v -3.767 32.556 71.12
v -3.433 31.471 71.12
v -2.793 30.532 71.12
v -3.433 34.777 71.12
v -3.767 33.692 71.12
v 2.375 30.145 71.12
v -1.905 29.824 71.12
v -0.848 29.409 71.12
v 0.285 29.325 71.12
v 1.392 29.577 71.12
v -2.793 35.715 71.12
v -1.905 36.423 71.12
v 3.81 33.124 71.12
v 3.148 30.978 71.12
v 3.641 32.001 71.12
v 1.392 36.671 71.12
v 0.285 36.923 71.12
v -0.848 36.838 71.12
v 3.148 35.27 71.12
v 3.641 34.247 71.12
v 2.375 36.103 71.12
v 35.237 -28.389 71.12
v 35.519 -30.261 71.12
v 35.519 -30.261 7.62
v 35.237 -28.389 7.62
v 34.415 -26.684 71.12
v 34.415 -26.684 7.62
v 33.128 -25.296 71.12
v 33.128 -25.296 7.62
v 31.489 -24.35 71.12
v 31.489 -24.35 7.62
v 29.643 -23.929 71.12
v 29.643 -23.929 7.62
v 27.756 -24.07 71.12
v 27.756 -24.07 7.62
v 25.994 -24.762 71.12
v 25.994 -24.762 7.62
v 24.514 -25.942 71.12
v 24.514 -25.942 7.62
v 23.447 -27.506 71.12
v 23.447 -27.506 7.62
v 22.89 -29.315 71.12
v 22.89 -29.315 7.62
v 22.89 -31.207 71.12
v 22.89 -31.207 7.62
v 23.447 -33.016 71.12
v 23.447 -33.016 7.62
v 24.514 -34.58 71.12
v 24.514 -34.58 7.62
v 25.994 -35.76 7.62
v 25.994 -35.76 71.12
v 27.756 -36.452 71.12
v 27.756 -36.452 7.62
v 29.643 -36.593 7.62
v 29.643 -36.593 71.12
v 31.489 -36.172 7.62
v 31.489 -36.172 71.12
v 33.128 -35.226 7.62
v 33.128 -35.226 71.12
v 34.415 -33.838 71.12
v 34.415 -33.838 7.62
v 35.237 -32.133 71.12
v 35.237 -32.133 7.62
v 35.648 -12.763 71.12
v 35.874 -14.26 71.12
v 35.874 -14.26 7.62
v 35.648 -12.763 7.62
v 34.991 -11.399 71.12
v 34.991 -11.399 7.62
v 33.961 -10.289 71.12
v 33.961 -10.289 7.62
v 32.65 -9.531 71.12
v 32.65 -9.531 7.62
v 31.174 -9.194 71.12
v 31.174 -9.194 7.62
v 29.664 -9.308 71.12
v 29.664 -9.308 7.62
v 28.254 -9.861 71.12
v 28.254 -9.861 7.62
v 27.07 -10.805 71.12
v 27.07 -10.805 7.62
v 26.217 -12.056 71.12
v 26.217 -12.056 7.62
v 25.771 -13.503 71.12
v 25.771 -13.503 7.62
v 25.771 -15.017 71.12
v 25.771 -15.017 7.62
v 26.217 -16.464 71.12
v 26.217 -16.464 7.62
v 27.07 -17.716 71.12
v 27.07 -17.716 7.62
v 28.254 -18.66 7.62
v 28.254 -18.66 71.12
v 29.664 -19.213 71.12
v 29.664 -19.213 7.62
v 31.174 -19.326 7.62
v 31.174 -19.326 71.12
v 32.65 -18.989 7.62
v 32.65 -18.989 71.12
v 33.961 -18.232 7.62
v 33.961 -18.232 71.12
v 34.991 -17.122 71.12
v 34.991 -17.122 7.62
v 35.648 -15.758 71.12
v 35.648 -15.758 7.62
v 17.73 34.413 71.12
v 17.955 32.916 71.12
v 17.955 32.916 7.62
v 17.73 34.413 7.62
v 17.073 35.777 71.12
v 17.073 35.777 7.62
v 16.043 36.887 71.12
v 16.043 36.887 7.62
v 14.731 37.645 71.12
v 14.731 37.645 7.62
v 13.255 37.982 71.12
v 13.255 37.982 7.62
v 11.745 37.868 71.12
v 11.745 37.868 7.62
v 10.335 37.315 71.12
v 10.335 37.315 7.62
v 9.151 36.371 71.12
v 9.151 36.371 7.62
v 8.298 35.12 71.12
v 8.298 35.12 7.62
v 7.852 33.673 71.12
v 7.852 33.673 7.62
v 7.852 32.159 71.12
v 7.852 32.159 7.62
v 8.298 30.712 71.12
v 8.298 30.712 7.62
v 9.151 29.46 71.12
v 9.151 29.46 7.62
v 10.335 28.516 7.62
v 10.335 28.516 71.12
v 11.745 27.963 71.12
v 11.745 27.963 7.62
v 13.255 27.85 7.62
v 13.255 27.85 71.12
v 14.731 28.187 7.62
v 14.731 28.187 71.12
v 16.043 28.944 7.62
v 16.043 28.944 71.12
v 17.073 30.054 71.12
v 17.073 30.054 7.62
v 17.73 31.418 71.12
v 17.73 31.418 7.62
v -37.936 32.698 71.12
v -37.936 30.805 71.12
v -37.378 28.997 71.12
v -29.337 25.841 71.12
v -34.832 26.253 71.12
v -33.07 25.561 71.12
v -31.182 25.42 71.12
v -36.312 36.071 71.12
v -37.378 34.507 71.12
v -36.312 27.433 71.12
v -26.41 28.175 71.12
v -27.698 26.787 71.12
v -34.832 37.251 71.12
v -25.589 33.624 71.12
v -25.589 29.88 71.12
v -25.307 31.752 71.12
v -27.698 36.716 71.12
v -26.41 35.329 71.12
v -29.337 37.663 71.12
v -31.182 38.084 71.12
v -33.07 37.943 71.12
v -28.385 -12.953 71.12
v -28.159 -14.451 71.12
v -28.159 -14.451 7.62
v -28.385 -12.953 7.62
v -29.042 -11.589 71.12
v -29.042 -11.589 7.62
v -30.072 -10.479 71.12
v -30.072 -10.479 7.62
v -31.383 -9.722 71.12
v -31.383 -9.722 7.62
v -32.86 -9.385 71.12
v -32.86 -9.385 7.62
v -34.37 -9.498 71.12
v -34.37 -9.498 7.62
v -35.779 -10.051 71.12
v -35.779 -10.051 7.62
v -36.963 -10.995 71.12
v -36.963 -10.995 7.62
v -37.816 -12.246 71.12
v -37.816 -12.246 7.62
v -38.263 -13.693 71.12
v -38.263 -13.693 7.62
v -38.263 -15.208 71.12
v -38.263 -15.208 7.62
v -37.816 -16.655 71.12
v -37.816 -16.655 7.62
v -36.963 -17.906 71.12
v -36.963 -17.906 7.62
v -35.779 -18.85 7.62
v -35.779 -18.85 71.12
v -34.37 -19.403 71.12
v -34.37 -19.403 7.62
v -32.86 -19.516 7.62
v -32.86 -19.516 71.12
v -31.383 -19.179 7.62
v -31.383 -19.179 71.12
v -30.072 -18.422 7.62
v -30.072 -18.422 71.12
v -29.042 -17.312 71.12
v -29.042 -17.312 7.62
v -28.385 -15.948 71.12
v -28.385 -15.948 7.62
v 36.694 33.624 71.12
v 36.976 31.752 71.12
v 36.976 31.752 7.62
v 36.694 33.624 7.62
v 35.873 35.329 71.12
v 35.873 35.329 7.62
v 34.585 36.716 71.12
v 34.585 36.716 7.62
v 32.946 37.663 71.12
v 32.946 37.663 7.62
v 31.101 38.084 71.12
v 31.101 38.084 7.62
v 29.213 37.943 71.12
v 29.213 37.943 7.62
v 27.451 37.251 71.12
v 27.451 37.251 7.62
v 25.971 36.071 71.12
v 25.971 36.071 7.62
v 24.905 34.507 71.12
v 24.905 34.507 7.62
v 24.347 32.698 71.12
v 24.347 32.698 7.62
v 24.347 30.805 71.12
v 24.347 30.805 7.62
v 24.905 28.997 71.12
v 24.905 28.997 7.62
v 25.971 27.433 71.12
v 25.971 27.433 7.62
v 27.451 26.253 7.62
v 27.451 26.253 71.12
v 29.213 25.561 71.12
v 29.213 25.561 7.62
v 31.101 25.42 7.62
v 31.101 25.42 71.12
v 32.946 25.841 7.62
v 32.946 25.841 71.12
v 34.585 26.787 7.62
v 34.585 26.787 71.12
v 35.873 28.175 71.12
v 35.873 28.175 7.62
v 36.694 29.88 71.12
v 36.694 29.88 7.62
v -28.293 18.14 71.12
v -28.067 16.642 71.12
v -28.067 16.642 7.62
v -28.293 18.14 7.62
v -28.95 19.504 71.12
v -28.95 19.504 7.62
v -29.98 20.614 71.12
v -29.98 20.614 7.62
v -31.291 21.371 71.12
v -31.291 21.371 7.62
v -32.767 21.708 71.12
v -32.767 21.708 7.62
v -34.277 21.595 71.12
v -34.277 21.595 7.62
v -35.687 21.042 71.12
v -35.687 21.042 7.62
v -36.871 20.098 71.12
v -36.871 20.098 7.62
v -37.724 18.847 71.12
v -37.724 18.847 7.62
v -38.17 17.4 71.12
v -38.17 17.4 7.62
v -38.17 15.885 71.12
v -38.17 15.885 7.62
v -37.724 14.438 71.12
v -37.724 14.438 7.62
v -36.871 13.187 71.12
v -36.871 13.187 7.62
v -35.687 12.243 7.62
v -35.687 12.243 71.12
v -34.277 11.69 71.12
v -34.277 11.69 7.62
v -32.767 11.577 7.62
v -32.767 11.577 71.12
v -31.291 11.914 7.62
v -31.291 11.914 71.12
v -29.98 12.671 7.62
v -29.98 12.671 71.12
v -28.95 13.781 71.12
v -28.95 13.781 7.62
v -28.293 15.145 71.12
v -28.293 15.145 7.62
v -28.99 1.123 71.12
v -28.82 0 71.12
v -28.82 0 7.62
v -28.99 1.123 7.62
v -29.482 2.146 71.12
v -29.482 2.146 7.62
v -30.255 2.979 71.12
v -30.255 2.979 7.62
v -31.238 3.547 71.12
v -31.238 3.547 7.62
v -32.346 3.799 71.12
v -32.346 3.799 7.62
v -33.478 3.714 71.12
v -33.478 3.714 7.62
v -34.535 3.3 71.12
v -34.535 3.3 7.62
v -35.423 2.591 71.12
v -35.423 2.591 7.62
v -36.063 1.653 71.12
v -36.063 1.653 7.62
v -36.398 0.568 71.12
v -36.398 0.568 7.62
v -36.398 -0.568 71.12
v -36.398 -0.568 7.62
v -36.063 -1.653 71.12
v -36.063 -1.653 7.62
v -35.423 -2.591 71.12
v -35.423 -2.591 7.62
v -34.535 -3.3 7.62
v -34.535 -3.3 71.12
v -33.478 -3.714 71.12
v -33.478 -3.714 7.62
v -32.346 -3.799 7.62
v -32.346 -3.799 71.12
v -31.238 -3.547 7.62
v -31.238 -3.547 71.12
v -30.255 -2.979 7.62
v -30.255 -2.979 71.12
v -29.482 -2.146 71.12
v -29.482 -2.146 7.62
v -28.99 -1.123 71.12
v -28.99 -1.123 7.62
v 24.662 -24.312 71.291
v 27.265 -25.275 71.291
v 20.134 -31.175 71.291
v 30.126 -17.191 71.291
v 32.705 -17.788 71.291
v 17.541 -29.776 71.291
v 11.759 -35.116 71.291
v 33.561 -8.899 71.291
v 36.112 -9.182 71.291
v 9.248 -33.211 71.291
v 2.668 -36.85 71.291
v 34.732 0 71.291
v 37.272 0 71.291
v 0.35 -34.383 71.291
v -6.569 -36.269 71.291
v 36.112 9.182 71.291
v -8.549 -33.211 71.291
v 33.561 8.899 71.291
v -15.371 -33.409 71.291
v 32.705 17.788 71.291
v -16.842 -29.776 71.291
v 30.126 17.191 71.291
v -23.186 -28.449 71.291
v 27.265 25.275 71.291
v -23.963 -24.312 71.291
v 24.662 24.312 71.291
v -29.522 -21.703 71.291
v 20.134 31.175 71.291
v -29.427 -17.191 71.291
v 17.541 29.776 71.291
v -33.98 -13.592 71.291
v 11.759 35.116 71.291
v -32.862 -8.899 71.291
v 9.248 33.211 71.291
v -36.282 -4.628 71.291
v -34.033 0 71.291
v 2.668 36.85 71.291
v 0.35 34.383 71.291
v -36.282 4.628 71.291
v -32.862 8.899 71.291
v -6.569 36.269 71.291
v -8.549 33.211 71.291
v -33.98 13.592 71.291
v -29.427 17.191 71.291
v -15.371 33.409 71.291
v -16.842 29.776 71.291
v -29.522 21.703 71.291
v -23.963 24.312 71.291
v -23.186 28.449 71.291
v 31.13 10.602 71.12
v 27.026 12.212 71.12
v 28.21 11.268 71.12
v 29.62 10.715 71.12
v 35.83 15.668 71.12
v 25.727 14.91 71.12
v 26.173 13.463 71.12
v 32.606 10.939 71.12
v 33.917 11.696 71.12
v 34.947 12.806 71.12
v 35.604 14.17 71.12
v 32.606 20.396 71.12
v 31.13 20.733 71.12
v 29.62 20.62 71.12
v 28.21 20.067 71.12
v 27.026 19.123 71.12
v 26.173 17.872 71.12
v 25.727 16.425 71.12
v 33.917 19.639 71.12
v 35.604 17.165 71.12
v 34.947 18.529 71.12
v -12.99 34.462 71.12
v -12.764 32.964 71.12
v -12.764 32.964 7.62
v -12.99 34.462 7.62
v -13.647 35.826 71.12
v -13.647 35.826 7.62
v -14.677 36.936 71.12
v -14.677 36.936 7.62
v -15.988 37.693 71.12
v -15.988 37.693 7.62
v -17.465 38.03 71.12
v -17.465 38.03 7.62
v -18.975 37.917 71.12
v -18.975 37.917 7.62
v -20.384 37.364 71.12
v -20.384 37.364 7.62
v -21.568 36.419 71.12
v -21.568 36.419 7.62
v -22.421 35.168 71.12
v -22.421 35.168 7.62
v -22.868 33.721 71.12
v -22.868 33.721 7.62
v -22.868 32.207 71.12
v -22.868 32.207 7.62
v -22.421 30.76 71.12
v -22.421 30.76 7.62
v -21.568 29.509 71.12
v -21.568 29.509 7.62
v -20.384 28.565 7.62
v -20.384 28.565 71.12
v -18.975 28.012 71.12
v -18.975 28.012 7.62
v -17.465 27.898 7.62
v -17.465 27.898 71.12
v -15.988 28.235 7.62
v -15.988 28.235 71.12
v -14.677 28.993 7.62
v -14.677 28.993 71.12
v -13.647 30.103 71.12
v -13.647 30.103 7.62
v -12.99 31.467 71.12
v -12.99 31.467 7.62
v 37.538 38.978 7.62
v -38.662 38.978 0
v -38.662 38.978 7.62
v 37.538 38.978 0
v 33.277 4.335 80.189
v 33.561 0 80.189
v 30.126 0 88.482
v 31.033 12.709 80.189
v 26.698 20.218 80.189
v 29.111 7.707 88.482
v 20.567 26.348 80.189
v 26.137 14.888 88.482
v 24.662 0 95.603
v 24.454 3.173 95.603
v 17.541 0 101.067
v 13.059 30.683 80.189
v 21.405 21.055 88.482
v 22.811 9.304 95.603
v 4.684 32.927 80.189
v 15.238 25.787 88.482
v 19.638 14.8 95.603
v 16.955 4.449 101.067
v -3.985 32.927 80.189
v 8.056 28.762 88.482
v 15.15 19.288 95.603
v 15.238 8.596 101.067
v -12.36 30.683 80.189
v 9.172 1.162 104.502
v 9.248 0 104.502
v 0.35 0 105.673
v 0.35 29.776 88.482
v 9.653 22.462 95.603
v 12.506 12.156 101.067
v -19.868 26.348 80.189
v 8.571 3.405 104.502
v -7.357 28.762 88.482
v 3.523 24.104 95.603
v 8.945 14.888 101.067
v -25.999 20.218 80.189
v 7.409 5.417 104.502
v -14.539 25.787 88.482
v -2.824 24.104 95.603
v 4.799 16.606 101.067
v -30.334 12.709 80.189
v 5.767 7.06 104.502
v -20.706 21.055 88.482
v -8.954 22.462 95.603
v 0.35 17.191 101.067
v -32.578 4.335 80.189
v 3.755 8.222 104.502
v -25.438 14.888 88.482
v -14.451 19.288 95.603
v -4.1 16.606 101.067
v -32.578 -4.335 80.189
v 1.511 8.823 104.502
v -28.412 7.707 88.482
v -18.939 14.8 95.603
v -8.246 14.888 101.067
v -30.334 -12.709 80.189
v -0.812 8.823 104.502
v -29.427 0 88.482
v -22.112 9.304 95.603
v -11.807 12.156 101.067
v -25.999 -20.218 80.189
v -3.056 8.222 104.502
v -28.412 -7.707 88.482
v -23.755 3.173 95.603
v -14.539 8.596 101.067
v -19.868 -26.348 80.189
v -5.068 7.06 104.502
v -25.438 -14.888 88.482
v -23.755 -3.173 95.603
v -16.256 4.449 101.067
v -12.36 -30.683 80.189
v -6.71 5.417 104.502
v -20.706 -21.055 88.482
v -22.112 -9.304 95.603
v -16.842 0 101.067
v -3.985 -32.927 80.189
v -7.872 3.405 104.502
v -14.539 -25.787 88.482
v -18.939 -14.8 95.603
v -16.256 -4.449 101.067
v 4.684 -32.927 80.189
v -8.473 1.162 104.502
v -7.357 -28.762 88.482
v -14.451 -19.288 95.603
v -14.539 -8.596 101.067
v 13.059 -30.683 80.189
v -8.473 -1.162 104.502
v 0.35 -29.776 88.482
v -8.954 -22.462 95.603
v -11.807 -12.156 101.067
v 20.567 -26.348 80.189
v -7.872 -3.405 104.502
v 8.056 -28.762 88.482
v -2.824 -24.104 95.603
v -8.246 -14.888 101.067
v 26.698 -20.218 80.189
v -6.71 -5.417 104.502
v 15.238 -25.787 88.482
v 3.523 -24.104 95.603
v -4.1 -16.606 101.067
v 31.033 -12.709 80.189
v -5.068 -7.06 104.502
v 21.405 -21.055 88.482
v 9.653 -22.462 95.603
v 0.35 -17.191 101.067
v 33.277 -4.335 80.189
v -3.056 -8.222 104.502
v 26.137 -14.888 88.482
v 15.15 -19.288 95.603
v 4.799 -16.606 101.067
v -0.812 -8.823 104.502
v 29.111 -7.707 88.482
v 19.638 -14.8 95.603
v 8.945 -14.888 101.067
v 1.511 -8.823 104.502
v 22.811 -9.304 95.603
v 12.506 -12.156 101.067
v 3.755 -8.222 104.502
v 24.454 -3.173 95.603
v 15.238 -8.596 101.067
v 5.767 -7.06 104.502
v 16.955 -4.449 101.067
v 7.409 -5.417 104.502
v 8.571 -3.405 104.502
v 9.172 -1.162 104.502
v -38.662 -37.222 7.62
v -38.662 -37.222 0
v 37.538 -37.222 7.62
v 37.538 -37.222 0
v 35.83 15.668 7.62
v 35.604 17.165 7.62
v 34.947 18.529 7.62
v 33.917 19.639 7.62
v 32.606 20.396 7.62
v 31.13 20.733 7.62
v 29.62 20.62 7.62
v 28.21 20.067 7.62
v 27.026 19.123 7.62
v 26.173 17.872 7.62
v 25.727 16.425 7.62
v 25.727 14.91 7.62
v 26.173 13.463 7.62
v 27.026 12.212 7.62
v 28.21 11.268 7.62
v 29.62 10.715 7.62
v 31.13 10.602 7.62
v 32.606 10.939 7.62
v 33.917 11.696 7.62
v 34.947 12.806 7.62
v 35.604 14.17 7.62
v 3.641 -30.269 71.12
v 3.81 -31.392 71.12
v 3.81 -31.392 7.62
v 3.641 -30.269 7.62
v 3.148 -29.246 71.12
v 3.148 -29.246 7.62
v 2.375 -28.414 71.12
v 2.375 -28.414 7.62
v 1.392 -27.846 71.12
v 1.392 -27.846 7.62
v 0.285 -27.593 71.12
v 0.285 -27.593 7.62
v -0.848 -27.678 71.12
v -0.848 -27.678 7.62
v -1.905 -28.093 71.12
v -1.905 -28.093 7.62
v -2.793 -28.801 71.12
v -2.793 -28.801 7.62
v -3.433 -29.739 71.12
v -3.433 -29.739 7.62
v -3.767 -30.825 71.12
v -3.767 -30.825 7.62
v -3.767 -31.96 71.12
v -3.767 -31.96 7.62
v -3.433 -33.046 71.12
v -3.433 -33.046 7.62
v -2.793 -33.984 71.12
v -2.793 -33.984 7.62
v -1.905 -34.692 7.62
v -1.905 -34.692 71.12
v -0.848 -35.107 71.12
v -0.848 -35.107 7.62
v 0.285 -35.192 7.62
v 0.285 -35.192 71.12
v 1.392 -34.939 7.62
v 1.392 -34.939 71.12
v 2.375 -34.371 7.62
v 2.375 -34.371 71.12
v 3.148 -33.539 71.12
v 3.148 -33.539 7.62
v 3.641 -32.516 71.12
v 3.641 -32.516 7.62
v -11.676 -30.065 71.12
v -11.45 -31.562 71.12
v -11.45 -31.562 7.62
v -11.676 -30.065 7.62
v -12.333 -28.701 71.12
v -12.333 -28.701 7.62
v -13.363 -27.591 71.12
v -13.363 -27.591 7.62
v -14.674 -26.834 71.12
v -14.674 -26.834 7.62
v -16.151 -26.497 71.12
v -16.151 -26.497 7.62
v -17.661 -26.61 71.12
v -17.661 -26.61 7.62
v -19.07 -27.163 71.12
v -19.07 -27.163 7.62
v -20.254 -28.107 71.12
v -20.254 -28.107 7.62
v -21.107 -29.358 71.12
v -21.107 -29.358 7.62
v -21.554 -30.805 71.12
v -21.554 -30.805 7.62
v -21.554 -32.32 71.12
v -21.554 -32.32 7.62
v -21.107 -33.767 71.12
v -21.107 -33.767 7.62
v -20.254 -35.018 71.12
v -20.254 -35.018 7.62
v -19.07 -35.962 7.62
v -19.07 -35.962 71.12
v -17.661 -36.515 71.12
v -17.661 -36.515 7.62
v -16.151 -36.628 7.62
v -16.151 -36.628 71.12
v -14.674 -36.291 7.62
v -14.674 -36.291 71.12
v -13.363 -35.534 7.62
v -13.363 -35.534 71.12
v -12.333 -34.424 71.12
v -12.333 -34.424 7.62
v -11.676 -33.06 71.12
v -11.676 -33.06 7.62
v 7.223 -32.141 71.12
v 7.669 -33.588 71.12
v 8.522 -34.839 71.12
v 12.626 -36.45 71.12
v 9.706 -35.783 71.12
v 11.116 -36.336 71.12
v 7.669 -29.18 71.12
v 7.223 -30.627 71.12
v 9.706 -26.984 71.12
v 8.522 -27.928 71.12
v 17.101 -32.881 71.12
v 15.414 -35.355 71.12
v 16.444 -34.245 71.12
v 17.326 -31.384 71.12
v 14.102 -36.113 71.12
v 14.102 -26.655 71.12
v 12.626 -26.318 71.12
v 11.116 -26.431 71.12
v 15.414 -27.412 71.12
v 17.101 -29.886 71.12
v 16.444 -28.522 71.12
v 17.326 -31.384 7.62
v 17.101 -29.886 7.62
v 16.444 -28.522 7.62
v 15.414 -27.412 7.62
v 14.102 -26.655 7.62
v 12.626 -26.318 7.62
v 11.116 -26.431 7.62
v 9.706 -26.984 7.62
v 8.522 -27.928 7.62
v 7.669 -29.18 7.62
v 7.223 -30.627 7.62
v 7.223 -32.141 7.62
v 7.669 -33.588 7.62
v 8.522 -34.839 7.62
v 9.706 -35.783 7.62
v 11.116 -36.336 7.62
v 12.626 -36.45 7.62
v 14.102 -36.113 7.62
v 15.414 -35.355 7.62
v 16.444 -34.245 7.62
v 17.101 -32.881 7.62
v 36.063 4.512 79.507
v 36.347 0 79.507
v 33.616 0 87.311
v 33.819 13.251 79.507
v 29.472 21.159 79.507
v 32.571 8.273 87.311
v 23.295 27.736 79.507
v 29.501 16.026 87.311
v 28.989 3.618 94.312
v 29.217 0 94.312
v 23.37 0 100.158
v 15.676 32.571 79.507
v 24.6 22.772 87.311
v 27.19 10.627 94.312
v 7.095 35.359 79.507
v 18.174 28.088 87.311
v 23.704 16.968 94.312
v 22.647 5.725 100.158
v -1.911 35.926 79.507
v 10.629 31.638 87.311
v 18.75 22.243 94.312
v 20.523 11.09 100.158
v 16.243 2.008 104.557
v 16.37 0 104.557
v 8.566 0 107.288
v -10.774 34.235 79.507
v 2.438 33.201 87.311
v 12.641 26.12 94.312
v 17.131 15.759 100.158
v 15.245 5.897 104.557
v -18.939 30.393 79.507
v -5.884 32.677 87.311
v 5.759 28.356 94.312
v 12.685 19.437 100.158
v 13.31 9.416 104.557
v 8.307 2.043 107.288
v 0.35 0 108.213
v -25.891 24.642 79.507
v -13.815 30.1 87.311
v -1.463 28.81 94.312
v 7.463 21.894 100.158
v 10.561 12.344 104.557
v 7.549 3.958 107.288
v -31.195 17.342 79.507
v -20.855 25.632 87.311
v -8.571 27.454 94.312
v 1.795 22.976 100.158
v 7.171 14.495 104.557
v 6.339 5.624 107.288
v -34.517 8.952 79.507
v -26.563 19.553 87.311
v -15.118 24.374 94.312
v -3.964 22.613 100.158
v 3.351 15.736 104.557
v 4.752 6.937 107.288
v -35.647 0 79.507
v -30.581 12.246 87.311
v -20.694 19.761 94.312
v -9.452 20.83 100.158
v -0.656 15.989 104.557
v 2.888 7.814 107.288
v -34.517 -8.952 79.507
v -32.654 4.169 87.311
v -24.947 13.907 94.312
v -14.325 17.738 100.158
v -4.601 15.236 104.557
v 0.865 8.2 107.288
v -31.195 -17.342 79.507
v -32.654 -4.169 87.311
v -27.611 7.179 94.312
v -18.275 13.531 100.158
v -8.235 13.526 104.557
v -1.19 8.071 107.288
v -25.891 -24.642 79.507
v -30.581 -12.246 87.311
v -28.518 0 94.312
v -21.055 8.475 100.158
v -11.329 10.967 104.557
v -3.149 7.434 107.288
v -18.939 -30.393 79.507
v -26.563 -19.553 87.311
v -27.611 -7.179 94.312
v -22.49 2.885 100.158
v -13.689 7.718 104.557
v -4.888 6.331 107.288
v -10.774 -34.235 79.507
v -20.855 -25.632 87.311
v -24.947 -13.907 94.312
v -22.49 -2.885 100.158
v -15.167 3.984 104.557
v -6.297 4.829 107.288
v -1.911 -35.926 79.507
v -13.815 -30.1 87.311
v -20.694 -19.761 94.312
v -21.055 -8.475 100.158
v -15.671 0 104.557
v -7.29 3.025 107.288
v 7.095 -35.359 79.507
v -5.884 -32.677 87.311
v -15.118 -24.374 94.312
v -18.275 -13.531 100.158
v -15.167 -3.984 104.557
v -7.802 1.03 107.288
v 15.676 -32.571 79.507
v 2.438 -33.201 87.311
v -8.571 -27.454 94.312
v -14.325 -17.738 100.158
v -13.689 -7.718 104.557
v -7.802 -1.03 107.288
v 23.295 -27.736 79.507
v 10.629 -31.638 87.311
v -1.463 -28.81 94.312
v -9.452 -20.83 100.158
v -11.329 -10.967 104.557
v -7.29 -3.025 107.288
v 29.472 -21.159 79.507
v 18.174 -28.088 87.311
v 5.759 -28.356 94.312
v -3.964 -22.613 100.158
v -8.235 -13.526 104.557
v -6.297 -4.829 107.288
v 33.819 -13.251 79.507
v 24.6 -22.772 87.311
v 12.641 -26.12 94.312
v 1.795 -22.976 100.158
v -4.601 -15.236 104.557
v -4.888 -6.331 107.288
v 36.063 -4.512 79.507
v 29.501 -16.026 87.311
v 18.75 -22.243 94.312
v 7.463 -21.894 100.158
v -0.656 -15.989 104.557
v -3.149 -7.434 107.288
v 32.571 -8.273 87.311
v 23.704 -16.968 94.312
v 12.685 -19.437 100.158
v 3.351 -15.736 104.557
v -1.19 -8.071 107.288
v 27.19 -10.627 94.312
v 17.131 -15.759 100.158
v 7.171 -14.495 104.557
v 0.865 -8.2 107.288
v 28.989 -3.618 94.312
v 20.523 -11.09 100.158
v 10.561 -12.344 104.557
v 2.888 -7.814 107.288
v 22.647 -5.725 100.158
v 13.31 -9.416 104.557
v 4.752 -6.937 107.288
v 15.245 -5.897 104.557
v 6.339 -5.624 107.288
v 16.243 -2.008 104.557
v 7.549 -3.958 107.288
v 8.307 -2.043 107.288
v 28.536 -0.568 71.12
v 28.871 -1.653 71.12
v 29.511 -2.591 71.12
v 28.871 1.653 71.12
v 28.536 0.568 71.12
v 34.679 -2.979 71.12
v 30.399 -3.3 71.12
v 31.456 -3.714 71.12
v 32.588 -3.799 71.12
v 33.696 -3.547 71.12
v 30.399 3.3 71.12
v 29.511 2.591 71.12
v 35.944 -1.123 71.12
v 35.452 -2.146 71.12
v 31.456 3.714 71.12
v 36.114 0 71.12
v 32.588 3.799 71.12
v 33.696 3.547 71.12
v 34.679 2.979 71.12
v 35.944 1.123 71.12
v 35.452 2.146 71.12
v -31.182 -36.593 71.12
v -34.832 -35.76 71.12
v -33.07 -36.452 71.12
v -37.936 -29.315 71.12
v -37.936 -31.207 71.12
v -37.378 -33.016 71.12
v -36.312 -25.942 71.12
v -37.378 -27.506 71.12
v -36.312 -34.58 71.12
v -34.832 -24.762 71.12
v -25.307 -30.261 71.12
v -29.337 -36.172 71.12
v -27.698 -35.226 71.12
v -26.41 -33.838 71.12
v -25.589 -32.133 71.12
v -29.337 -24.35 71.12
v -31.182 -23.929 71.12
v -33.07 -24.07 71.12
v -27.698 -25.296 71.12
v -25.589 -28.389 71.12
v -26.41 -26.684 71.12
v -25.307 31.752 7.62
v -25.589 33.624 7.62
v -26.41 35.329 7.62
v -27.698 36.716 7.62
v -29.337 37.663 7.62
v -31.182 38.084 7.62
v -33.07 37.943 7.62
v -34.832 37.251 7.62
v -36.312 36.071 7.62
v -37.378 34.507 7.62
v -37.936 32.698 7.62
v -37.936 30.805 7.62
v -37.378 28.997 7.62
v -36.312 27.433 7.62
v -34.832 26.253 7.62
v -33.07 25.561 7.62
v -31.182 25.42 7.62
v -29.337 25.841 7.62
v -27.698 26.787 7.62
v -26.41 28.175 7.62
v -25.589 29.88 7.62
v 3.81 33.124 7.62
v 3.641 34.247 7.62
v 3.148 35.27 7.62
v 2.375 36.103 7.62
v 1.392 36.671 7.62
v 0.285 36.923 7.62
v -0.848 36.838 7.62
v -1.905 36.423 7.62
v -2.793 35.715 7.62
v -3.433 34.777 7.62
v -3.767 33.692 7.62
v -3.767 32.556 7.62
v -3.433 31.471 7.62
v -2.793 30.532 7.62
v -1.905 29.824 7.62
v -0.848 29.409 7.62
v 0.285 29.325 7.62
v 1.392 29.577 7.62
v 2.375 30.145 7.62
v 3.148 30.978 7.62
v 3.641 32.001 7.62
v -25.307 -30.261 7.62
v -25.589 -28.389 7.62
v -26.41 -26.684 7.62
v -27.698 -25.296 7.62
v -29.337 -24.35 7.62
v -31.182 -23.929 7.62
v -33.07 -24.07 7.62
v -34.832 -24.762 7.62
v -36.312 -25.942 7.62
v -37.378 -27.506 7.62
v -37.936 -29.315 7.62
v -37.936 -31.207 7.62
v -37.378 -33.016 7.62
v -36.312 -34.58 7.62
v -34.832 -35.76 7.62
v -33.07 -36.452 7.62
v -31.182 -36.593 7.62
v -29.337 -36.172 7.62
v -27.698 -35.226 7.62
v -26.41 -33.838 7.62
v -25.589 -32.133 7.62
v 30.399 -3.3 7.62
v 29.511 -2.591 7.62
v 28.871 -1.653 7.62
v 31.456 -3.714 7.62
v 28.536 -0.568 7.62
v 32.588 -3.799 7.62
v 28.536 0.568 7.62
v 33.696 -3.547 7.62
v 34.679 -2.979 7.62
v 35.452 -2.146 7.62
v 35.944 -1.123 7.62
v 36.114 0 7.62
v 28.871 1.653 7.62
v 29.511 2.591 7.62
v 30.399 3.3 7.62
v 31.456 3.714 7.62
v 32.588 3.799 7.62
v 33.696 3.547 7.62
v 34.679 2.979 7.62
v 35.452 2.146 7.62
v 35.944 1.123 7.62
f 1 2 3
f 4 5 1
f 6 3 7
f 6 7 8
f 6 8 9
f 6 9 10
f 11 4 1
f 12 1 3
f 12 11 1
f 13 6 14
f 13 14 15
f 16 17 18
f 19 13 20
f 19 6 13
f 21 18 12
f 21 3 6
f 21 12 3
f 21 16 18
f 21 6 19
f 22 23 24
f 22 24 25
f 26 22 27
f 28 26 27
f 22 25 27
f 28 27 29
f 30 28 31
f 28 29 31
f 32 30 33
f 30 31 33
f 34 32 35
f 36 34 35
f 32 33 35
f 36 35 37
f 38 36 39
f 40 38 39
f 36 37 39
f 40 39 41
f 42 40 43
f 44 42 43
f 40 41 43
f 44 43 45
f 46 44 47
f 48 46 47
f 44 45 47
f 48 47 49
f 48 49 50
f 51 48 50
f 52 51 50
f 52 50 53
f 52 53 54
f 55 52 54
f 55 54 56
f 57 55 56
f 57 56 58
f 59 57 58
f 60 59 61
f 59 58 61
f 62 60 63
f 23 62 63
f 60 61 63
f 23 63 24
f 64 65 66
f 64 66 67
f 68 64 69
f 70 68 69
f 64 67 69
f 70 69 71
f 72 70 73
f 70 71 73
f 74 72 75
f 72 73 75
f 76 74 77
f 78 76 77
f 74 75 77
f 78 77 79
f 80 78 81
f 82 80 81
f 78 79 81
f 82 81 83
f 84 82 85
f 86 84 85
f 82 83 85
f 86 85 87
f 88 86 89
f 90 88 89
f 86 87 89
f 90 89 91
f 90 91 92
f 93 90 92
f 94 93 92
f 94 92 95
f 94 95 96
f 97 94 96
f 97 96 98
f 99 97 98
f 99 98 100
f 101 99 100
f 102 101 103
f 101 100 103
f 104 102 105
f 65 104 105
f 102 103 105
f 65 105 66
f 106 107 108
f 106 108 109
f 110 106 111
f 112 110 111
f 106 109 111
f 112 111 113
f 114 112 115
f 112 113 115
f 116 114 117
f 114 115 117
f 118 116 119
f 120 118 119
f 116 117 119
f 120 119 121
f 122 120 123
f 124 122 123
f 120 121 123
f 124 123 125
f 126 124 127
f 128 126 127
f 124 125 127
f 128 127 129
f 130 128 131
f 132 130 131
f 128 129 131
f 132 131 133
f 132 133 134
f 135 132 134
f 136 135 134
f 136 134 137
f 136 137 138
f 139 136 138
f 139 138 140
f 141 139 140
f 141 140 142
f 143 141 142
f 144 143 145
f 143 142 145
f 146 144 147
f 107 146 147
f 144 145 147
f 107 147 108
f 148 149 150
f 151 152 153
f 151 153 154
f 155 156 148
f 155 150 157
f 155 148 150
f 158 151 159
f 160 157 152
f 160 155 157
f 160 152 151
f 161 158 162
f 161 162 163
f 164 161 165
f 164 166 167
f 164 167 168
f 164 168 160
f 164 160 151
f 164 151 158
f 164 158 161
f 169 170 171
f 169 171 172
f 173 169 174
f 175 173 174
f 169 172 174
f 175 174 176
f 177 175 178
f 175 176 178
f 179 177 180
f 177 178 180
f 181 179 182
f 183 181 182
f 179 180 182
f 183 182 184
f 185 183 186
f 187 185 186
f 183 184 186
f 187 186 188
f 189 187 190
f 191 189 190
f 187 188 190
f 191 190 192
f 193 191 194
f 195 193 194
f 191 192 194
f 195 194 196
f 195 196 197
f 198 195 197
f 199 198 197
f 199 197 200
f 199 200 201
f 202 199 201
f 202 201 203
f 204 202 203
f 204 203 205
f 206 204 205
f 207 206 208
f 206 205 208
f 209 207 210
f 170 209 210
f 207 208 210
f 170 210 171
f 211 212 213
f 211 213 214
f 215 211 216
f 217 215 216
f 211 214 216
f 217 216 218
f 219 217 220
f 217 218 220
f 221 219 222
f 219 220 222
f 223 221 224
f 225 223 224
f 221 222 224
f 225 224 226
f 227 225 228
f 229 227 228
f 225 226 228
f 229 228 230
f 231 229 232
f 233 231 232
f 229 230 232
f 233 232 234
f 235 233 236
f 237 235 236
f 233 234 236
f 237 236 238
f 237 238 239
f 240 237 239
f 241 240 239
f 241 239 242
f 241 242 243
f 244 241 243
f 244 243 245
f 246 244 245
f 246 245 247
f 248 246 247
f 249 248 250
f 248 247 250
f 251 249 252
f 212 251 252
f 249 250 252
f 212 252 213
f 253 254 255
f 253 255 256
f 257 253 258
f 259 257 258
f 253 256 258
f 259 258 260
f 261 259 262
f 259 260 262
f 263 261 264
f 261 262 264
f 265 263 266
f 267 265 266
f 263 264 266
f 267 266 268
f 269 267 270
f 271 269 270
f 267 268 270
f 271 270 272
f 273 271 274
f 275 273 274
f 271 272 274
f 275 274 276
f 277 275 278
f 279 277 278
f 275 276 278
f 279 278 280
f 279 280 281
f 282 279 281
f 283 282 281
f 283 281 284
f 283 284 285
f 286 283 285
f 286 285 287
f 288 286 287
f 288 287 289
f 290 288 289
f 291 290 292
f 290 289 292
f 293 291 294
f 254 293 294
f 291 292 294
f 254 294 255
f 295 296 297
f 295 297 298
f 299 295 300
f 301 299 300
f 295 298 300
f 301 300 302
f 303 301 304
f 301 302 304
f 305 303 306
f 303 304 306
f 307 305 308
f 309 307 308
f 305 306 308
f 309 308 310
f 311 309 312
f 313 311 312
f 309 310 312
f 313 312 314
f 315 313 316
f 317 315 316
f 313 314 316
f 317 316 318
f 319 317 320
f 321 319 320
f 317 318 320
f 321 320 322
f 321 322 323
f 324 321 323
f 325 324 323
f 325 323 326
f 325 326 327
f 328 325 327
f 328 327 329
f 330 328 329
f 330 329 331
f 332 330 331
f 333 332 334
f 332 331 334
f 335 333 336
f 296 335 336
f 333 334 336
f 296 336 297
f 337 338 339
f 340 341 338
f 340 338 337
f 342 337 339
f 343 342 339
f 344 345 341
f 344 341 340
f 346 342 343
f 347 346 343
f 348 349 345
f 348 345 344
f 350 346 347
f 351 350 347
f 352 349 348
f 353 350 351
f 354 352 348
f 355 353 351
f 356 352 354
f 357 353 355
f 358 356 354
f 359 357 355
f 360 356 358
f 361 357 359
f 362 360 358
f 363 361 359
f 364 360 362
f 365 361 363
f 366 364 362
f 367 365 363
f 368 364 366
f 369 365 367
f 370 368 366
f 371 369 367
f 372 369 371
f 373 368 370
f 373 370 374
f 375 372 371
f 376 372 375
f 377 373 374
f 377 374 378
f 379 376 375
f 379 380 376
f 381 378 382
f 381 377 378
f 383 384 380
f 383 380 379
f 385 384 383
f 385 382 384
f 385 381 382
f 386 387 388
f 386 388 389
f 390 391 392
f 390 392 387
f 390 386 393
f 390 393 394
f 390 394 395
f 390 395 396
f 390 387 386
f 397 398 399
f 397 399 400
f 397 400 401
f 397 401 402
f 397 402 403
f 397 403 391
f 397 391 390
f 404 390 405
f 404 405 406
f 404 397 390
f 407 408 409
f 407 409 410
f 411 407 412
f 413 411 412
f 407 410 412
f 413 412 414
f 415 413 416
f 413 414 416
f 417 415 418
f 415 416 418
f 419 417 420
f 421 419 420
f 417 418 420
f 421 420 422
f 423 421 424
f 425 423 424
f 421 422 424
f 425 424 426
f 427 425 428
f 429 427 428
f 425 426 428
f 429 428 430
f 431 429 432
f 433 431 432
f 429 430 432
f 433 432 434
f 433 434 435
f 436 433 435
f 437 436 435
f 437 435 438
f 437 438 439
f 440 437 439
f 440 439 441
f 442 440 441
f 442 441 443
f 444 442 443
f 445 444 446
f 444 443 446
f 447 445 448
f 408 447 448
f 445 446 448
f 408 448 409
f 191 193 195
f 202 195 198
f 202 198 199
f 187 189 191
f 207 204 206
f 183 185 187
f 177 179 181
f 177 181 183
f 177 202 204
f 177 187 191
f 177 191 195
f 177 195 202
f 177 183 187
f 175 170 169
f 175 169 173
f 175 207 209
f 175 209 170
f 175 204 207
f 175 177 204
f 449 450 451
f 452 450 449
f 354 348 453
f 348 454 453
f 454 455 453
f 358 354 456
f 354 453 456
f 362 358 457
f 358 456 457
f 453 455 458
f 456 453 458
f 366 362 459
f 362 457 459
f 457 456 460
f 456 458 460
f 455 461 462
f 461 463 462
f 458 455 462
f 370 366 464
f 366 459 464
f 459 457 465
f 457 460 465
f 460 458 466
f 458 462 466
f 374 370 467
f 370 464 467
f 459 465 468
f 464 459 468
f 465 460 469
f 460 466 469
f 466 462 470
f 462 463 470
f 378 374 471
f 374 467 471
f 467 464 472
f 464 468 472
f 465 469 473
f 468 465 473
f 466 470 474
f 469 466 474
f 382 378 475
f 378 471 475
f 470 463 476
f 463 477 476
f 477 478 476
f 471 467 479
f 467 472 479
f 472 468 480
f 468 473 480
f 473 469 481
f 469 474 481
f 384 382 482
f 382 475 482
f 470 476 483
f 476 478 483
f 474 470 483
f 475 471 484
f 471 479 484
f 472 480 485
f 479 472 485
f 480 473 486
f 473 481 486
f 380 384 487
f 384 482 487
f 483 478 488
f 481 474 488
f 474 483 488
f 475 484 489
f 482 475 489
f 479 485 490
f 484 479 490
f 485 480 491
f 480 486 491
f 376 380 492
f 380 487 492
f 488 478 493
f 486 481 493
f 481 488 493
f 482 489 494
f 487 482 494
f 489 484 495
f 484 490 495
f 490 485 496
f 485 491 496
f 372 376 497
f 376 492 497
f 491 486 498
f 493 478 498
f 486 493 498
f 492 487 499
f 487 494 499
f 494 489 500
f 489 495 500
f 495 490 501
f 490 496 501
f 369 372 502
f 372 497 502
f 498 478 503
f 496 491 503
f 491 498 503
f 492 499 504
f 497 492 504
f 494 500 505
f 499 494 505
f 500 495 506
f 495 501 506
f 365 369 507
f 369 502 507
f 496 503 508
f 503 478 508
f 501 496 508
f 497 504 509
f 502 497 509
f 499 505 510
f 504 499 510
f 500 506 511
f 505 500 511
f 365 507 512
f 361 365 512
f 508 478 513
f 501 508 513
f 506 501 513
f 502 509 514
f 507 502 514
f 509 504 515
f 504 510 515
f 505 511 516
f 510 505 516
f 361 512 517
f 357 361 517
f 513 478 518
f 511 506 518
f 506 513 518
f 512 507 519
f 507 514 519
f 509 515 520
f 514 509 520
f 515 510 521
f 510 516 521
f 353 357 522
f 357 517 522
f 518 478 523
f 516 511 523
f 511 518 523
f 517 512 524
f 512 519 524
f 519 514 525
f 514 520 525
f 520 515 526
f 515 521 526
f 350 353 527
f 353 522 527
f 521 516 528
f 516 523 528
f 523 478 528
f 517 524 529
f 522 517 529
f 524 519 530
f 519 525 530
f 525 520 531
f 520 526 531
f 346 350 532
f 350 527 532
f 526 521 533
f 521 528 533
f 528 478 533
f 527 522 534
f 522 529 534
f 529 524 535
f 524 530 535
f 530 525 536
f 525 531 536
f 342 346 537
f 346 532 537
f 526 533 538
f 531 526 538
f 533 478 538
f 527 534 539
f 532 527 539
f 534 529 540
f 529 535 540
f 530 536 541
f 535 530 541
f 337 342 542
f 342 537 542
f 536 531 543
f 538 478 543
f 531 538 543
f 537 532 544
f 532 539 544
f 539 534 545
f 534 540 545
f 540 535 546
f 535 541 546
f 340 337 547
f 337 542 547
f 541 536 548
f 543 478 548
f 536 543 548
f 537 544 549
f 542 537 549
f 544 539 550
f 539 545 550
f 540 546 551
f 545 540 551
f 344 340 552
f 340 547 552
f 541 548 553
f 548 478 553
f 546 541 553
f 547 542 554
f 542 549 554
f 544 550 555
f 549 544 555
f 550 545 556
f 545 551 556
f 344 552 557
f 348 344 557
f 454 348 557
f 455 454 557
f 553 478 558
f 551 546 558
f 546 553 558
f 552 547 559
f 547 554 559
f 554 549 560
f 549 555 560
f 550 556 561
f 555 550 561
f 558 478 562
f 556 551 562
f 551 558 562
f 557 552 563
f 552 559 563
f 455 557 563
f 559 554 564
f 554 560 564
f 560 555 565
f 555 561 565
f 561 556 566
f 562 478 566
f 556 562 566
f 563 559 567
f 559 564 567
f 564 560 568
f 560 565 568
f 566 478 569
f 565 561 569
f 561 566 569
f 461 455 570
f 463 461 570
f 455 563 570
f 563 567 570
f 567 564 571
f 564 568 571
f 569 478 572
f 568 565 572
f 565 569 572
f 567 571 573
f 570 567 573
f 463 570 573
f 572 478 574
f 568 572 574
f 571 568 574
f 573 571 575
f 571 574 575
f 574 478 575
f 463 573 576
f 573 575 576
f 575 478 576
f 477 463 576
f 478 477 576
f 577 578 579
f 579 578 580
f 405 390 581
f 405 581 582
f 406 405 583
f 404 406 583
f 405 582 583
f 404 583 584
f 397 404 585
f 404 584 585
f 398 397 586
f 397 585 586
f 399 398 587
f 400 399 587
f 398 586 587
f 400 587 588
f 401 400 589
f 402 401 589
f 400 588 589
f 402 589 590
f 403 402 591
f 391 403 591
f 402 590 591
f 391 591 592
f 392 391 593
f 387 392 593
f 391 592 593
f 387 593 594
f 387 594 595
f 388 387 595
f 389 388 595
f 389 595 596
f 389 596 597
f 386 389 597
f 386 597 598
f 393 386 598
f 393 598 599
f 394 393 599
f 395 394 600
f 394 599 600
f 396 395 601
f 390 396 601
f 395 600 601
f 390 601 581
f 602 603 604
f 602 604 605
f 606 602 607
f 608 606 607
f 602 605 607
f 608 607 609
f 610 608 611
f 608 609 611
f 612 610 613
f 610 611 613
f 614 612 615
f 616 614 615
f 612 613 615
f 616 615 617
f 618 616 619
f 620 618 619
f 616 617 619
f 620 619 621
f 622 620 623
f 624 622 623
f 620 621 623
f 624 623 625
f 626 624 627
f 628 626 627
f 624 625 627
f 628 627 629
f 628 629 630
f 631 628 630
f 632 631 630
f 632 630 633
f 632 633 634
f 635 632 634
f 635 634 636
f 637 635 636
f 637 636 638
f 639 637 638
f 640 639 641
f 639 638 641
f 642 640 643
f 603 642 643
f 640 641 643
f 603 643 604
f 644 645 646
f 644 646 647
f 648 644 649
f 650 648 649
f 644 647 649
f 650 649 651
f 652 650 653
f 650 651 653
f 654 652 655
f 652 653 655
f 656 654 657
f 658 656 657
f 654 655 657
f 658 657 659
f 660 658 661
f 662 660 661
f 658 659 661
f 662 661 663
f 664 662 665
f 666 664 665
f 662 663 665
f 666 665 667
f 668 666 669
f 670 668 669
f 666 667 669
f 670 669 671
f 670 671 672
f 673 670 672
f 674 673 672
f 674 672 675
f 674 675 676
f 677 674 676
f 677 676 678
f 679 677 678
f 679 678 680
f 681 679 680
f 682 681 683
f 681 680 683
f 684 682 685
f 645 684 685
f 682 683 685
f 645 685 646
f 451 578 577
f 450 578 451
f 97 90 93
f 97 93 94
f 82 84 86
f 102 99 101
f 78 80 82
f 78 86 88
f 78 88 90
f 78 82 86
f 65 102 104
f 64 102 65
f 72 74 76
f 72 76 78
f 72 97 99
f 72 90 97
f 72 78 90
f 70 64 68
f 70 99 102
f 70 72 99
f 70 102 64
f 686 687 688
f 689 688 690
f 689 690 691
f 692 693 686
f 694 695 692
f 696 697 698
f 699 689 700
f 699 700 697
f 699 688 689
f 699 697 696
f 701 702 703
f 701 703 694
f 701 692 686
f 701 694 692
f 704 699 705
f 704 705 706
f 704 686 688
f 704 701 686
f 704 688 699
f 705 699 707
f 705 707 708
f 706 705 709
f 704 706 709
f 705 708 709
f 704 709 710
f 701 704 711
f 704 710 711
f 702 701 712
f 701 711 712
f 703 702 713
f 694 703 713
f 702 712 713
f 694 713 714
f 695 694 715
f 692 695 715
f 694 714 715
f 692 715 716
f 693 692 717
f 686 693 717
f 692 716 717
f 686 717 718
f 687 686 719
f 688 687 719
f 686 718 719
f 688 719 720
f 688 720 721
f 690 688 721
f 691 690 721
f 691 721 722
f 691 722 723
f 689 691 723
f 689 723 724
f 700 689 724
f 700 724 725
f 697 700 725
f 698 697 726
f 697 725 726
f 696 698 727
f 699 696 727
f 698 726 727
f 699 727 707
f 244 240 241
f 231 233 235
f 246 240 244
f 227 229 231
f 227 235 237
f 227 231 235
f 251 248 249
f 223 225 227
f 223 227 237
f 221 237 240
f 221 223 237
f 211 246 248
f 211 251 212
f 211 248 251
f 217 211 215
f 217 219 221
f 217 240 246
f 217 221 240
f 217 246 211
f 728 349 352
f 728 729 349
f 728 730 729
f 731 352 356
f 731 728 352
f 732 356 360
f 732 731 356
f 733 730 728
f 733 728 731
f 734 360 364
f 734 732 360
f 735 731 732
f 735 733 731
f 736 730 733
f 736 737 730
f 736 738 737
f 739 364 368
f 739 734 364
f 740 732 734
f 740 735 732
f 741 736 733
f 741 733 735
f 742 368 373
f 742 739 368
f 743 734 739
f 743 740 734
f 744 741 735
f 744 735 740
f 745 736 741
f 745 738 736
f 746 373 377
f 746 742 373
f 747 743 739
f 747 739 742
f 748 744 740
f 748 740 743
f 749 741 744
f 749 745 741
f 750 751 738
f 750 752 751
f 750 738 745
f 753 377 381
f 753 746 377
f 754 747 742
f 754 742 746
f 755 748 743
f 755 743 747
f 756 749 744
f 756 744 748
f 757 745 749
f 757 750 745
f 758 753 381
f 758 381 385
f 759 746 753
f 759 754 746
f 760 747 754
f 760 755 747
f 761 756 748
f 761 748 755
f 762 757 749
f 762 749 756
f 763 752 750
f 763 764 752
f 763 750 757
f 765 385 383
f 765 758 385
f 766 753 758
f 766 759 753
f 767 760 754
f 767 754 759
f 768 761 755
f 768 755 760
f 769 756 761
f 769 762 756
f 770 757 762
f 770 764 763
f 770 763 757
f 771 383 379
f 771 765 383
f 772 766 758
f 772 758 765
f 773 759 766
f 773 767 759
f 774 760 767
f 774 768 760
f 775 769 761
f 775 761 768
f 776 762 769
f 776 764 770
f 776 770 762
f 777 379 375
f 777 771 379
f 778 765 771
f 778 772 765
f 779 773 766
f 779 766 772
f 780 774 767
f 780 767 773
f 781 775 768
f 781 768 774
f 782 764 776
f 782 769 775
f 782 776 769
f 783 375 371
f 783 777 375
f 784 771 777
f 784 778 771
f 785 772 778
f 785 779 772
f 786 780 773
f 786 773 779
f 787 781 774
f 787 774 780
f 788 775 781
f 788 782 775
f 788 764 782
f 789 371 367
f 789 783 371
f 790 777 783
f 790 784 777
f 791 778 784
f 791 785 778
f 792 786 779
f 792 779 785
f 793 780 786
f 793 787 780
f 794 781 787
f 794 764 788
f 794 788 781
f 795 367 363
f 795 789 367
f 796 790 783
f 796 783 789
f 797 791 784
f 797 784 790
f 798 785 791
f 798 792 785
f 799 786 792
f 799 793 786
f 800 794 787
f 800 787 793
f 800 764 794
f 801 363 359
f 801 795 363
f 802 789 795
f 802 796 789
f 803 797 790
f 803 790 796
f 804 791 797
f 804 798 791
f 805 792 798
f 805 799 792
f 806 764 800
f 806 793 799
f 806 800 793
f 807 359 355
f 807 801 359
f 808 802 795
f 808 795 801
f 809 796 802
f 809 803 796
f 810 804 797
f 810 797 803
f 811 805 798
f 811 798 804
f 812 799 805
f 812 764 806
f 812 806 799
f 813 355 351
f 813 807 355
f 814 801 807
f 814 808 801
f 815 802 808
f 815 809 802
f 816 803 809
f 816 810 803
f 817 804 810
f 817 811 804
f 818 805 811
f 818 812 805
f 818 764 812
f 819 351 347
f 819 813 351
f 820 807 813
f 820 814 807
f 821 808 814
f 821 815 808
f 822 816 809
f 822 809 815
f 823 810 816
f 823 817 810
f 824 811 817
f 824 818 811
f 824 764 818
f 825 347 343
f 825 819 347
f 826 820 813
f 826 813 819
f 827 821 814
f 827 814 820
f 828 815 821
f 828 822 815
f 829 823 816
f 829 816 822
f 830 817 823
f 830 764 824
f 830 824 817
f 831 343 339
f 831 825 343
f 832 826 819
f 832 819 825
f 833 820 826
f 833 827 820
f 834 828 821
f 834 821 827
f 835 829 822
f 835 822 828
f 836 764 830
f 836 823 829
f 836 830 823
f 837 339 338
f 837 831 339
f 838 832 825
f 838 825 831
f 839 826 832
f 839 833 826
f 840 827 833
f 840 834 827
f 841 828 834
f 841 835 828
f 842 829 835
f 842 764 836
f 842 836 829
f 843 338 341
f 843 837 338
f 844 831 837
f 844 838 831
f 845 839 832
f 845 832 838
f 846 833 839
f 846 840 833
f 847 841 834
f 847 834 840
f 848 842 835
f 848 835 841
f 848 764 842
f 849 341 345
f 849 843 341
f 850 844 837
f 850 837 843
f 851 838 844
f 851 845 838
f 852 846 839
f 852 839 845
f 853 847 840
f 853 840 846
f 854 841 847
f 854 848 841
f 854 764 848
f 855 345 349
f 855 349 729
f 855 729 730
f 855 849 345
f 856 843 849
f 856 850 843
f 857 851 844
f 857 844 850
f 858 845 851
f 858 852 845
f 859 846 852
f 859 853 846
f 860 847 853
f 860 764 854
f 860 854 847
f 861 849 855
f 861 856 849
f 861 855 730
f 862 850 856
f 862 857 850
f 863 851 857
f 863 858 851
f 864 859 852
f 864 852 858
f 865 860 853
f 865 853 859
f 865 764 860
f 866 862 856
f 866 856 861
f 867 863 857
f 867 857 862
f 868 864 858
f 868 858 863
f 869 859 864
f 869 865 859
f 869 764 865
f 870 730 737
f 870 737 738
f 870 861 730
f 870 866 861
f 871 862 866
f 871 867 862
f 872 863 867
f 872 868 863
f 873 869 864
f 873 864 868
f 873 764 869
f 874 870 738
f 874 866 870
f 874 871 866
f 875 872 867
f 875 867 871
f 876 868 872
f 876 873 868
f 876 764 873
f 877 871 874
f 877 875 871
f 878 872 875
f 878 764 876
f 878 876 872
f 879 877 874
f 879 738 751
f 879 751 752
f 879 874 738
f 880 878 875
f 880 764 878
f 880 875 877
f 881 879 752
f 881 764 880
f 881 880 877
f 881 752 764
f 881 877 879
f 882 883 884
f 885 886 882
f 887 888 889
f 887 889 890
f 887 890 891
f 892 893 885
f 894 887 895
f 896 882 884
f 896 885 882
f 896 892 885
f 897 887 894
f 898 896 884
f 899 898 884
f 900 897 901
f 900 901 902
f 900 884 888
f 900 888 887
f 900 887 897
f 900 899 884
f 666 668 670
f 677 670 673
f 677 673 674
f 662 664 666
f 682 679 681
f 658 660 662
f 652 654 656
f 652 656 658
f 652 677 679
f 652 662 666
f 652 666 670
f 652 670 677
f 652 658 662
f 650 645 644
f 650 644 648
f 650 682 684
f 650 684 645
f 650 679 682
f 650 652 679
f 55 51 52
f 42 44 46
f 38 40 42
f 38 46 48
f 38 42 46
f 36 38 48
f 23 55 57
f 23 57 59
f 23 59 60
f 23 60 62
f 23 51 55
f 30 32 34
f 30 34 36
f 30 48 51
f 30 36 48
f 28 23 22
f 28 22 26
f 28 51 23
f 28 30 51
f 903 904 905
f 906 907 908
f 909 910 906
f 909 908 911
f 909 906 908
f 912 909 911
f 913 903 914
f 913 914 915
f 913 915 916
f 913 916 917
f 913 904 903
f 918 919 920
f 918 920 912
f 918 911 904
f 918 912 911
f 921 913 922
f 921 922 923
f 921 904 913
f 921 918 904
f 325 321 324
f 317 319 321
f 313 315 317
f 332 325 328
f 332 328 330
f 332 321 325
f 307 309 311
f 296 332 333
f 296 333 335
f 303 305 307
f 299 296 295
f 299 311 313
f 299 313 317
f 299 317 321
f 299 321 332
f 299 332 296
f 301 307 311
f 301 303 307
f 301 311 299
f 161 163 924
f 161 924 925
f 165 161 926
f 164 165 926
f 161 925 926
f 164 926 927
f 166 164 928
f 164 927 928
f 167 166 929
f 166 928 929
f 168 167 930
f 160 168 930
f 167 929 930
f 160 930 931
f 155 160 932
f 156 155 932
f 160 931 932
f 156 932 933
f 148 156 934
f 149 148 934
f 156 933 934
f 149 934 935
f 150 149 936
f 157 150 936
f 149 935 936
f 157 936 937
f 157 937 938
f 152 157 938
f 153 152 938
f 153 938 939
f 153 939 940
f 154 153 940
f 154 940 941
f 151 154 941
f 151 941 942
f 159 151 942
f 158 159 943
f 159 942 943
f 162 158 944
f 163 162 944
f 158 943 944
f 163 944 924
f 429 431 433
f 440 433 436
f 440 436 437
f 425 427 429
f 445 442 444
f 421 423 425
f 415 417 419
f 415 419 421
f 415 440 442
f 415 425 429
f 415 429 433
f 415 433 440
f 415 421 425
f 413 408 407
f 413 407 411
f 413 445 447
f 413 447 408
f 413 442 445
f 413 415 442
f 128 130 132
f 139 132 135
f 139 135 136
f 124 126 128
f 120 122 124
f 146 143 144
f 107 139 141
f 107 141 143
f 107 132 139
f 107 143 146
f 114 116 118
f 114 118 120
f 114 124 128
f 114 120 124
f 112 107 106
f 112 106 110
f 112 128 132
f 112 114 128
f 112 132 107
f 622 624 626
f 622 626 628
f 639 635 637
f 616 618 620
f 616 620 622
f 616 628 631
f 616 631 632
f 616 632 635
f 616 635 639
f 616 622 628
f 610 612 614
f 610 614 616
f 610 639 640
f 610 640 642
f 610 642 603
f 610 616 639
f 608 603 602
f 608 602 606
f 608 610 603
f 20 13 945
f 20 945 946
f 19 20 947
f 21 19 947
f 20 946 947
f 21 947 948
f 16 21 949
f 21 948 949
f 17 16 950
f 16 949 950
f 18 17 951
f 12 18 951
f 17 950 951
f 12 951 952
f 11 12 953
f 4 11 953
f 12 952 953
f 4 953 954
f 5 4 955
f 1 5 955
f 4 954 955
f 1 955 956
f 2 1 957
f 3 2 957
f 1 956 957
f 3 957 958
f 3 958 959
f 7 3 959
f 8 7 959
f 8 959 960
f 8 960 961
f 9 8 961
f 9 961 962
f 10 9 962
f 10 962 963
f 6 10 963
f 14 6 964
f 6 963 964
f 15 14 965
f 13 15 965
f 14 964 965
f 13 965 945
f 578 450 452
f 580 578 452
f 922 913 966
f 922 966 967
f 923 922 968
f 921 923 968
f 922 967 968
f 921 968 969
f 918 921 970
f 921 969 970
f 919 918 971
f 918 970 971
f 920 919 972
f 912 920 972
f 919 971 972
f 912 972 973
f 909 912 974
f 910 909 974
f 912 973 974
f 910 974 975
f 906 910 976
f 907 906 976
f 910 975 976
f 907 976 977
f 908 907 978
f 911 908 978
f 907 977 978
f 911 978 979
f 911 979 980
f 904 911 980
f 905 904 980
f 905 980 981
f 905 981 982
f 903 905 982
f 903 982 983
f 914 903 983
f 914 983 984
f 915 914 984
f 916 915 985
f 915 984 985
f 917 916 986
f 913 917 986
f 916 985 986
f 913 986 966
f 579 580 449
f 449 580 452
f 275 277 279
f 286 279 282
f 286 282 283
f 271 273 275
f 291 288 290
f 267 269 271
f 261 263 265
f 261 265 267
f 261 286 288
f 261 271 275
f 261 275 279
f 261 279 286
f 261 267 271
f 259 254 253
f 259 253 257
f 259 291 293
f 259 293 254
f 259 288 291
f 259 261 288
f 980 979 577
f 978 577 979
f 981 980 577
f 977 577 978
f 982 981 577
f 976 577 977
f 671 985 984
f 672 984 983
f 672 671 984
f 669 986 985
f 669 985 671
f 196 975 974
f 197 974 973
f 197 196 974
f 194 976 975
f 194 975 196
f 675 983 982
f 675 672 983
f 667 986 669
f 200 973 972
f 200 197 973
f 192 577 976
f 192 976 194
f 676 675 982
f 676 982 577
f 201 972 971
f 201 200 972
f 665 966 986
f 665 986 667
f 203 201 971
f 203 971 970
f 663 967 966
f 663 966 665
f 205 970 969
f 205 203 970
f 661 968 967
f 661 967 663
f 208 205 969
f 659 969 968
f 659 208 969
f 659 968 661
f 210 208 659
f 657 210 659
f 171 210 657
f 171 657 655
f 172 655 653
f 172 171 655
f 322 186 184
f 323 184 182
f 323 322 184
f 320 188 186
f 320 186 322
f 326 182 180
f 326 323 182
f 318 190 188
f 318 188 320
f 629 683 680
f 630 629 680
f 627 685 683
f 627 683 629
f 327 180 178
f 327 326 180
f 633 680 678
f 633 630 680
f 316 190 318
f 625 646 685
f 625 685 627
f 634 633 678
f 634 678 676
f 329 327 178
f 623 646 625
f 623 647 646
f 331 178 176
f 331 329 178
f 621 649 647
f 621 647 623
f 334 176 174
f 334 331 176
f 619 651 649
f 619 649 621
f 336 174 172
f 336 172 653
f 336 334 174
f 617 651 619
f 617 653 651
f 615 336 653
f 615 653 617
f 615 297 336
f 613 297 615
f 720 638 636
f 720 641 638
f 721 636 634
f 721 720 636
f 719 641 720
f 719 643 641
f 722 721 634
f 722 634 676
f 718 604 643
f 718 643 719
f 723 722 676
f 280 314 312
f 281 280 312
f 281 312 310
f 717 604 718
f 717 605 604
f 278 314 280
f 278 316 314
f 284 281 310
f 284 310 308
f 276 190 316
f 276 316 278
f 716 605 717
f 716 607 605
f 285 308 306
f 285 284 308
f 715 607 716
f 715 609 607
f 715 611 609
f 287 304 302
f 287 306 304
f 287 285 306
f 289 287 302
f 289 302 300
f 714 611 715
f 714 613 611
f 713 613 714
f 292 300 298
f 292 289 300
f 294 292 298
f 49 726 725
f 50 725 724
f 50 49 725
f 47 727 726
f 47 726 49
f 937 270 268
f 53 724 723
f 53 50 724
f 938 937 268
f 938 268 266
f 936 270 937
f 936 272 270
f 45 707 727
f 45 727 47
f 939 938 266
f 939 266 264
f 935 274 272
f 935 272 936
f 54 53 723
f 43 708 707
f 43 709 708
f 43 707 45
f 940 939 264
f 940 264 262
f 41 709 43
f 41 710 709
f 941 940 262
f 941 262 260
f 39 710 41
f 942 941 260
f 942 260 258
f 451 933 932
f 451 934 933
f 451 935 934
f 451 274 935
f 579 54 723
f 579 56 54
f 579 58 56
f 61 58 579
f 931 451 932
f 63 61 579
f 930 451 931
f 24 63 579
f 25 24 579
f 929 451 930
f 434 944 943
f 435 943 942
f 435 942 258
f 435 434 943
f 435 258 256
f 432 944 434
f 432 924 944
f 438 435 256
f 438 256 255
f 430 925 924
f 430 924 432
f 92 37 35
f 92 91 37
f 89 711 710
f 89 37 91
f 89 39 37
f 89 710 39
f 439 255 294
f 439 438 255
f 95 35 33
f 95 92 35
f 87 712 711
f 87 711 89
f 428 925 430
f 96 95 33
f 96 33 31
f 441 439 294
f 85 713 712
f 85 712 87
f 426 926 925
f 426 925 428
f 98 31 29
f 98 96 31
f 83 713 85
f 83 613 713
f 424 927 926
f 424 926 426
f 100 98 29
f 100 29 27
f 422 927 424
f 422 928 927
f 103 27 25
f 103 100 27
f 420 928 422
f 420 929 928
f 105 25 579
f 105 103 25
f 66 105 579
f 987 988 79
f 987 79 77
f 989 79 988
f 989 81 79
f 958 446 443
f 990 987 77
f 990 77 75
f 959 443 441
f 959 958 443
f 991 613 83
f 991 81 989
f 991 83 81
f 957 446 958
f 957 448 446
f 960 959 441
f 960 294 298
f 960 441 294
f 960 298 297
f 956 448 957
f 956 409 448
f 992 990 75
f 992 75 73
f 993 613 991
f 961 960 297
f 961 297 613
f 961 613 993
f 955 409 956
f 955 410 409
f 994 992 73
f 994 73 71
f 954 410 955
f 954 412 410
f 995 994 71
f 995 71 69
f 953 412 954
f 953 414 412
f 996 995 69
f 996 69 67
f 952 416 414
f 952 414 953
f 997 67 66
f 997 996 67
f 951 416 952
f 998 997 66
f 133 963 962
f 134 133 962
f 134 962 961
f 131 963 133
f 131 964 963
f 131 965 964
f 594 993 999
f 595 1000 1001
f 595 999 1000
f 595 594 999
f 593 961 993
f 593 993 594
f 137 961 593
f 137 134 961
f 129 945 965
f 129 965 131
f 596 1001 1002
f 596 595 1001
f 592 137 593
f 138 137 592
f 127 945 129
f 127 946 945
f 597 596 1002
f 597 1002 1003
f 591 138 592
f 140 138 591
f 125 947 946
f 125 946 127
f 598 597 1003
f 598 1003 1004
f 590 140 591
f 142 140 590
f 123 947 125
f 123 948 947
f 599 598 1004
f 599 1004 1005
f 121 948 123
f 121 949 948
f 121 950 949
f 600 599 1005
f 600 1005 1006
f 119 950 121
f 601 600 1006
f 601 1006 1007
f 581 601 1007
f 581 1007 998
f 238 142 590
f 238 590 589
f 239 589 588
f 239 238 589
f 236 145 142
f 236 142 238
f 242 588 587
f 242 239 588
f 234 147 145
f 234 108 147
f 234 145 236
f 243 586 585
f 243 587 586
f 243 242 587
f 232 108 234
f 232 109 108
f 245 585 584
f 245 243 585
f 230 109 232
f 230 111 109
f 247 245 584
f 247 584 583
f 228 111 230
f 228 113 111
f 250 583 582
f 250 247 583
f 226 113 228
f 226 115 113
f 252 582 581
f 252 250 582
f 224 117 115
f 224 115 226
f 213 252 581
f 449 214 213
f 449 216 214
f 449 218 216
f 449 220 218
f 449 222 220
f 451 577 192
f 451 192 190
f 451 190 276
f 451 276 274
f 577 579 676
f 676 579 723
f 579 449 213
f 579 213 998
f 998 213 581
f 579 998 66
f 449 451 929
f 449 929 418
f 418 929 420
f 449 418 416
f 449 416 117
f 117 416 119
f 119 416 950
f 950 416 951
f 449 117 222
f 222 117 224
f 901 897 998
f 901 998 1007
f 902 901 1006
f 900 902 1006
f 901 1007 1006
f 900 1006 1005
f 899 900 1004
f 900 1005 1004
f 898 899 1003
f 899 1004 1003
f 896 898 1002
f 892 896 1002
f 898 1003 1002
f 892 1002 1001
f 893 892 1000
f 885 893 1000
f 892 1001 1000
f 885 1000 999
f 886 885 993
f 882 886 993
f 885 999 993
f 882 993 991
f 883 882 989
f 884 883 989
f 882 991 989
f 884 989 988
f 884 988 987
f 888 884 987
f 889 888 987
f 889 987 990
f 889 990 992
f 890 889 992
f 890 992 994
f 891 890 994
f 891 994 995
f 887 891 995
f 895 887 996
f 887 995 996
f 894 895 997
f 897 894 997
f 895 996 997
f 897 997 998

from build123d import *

# Parameters (mm, degrees)
F0_W     = 76.2
F0_H     = 76.2
F1_DEPTH = 7.62
F2_R     = 6.35
F3_DEPTH = 63.5
F4_R     = 3.81
F4_R_2   = 5.08
F5_DEPTH = 63.5
F8_T     = -2.54


with BuildPart() as f1:
    # F0 (on Top) → F1 (new body)
    with BuildSketch(Plane.XY):
        with Locations((-0.5621163353, 0.8783638477)):
            Rectangle(F0_W, F0_H)
    extrude(amount=F1_DEPTH)

    # F2 (on face) → F3 (join)
    with BuildSketch(Plane.XY.offset(7.62)):
        with Locations((-31.6567011178, -30.260970816)):
            Circle(F2_R)
        with Locations((-31.6567011178, 31.751845032)):
            Circle(F2_R)
        with Locations((30.6261945516, 31.751845032)):
            Circle(F2_R)
        with Locations((29.1686486453, -30.260970816)):
            Circle(F2_R)
    extrude(amount=F3_DEPTH)

    # F4 (on face) → F5 (join)
    with BuildSketch(Plane.XY.offset(7.62)):
        with Locations((-32.6304073501, 0)):
            Circle(F4_R)
        with Locations((0, 33.1239178777)):
            Circle(F4_R)
        with Locations((32.3036797345, 0)):
            Circle(F4_R)
        with Locations((0, -31.3924998045)):
            Circle(F4_R)
        with Locations((-16.5303461254, -31.5624736249)):
            Circle(F4_R_2)
        with Locations((12.2462743893, -31.3837528229)):
            Circle(F4_R_2)
        with Locations((30.7939685881, -14.2602371052)):
            Circle(F4_R_2)
        with Locations((30.7500511408, 15.6675372273)):
            Circle(F4_R_2)
        with Locations((12.8753008321, 32.9157449305)):
            Circle(F4_R_2)
        with Locations((-17.8443100303, 32.9642146826)):
            Circle(F4_R_2)
        with Locations((-33.1468991935, 16.6424196213)):
            Circle(F4_R_2)
        with Locations((-33.2393012941, -14.4505742937)):
            Circle(F4_R_2)
    extrude(amount=F5_DEPTH)


with BuildPart() as f7:
    # F6 (on Front) → F7 (revolve)
    with BuildSketch(Plane.XZ):
        with BuildLine():
            Line((0.349506241, 71.2905749679), (37.2722359268, 71.2905749679))
            ThreePointArc((37.2722359268, 71.2905749679), (26.4578187817, 97.3988875086), (0.349506241, 108.2133046536))
            Line((0.349506241, 108.2133046536), (0.349506241, 71.2905749679))
        make_face()
    revolve(axis=Axis((0.349506241, 0, 89.7519398107), (0, 0, 1)))

    # F8
    f8_openings = [f7.faces().sort_by_distance(p)[0] for p in [
        (0.349506, 0, 71.290575),
    ]]
    offset(amount=F8_T, openings=f8_openings)


solid = Compound([f1.part, f7.part])
